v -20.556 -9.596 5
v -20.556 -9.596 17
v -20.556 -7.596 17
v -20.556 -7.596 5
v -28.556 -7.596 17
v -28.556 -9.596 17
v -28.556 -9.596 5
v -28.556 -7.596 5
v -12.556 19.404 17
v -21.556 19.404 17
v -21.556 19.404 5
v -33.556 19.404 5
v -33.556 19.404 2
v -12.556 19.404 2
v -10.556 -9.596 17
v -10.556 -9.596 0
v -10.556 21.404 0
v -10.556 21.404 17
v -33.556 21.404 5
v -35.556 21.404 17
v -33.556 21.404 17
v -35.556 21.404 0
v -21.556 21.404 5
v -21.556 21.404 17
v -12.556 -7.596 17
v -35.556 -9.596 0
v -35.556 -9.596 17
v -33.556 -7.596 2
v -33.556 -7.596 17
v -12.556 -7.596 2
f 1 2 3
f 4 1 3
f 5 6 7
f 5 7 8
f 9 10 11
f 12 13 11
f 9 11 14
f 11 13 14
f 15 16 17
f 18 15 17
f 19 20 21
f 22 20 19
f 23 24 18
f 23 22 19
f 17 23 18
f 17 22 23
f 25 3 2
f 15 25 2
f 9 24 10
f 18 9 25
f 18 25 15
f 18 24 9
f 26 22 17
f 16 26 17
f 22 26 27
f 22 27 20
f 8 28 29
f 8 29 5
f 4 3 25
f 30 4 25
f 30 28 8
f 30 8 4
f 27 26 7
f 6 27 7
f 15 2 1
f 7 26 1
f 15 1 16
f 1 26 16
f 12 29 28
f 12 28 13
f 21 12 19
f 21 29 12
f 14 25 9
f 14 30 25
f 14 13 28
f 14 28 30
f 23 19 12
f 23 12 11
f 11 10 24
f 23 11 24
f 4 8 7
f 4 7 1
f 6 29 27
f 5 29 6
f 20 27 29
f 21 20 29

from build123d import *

# Parameters (mm, degrees)
F0_W     = 25
F0_H     = 31
F1_DEPTH = 17
F2_T     = -2
F3_W     = 8
F3_H     = 2
F3_W_2   = 12
F4_DEPTH = 12


with BuildPart() as f1:
    # F0 (on Top) → F1 (new body)
    with BuildSketch(Plane.XY):
        with Locations((-23.056051, 5.904353)):
            Rectangle(F0_W, F0_H)
    extrude(amount=F1_DEPTH)

    # F2
    f2_openings = [f1.faces().sort_by_distance(p)[0] for p in [
        (-23.056051, 5.904353, 17),
    ]]
    offset(amount=F2_T, openings=f2_openings)

    # F3 (on face) → F4 (cut)
    with BuildSketch(Plane.XY.offset(17)):
        with Locations((-24.556051, -8.595647)):
            Rectangle(F3_W, F3_H)
        with Locations((-27.556051, 20.404353)):
            Rectangle(F3_W_2, F3_H)
    extrude(amount=-F4_DEPTH, mode=Mode.SUBTRACT)


solid = f1.part
